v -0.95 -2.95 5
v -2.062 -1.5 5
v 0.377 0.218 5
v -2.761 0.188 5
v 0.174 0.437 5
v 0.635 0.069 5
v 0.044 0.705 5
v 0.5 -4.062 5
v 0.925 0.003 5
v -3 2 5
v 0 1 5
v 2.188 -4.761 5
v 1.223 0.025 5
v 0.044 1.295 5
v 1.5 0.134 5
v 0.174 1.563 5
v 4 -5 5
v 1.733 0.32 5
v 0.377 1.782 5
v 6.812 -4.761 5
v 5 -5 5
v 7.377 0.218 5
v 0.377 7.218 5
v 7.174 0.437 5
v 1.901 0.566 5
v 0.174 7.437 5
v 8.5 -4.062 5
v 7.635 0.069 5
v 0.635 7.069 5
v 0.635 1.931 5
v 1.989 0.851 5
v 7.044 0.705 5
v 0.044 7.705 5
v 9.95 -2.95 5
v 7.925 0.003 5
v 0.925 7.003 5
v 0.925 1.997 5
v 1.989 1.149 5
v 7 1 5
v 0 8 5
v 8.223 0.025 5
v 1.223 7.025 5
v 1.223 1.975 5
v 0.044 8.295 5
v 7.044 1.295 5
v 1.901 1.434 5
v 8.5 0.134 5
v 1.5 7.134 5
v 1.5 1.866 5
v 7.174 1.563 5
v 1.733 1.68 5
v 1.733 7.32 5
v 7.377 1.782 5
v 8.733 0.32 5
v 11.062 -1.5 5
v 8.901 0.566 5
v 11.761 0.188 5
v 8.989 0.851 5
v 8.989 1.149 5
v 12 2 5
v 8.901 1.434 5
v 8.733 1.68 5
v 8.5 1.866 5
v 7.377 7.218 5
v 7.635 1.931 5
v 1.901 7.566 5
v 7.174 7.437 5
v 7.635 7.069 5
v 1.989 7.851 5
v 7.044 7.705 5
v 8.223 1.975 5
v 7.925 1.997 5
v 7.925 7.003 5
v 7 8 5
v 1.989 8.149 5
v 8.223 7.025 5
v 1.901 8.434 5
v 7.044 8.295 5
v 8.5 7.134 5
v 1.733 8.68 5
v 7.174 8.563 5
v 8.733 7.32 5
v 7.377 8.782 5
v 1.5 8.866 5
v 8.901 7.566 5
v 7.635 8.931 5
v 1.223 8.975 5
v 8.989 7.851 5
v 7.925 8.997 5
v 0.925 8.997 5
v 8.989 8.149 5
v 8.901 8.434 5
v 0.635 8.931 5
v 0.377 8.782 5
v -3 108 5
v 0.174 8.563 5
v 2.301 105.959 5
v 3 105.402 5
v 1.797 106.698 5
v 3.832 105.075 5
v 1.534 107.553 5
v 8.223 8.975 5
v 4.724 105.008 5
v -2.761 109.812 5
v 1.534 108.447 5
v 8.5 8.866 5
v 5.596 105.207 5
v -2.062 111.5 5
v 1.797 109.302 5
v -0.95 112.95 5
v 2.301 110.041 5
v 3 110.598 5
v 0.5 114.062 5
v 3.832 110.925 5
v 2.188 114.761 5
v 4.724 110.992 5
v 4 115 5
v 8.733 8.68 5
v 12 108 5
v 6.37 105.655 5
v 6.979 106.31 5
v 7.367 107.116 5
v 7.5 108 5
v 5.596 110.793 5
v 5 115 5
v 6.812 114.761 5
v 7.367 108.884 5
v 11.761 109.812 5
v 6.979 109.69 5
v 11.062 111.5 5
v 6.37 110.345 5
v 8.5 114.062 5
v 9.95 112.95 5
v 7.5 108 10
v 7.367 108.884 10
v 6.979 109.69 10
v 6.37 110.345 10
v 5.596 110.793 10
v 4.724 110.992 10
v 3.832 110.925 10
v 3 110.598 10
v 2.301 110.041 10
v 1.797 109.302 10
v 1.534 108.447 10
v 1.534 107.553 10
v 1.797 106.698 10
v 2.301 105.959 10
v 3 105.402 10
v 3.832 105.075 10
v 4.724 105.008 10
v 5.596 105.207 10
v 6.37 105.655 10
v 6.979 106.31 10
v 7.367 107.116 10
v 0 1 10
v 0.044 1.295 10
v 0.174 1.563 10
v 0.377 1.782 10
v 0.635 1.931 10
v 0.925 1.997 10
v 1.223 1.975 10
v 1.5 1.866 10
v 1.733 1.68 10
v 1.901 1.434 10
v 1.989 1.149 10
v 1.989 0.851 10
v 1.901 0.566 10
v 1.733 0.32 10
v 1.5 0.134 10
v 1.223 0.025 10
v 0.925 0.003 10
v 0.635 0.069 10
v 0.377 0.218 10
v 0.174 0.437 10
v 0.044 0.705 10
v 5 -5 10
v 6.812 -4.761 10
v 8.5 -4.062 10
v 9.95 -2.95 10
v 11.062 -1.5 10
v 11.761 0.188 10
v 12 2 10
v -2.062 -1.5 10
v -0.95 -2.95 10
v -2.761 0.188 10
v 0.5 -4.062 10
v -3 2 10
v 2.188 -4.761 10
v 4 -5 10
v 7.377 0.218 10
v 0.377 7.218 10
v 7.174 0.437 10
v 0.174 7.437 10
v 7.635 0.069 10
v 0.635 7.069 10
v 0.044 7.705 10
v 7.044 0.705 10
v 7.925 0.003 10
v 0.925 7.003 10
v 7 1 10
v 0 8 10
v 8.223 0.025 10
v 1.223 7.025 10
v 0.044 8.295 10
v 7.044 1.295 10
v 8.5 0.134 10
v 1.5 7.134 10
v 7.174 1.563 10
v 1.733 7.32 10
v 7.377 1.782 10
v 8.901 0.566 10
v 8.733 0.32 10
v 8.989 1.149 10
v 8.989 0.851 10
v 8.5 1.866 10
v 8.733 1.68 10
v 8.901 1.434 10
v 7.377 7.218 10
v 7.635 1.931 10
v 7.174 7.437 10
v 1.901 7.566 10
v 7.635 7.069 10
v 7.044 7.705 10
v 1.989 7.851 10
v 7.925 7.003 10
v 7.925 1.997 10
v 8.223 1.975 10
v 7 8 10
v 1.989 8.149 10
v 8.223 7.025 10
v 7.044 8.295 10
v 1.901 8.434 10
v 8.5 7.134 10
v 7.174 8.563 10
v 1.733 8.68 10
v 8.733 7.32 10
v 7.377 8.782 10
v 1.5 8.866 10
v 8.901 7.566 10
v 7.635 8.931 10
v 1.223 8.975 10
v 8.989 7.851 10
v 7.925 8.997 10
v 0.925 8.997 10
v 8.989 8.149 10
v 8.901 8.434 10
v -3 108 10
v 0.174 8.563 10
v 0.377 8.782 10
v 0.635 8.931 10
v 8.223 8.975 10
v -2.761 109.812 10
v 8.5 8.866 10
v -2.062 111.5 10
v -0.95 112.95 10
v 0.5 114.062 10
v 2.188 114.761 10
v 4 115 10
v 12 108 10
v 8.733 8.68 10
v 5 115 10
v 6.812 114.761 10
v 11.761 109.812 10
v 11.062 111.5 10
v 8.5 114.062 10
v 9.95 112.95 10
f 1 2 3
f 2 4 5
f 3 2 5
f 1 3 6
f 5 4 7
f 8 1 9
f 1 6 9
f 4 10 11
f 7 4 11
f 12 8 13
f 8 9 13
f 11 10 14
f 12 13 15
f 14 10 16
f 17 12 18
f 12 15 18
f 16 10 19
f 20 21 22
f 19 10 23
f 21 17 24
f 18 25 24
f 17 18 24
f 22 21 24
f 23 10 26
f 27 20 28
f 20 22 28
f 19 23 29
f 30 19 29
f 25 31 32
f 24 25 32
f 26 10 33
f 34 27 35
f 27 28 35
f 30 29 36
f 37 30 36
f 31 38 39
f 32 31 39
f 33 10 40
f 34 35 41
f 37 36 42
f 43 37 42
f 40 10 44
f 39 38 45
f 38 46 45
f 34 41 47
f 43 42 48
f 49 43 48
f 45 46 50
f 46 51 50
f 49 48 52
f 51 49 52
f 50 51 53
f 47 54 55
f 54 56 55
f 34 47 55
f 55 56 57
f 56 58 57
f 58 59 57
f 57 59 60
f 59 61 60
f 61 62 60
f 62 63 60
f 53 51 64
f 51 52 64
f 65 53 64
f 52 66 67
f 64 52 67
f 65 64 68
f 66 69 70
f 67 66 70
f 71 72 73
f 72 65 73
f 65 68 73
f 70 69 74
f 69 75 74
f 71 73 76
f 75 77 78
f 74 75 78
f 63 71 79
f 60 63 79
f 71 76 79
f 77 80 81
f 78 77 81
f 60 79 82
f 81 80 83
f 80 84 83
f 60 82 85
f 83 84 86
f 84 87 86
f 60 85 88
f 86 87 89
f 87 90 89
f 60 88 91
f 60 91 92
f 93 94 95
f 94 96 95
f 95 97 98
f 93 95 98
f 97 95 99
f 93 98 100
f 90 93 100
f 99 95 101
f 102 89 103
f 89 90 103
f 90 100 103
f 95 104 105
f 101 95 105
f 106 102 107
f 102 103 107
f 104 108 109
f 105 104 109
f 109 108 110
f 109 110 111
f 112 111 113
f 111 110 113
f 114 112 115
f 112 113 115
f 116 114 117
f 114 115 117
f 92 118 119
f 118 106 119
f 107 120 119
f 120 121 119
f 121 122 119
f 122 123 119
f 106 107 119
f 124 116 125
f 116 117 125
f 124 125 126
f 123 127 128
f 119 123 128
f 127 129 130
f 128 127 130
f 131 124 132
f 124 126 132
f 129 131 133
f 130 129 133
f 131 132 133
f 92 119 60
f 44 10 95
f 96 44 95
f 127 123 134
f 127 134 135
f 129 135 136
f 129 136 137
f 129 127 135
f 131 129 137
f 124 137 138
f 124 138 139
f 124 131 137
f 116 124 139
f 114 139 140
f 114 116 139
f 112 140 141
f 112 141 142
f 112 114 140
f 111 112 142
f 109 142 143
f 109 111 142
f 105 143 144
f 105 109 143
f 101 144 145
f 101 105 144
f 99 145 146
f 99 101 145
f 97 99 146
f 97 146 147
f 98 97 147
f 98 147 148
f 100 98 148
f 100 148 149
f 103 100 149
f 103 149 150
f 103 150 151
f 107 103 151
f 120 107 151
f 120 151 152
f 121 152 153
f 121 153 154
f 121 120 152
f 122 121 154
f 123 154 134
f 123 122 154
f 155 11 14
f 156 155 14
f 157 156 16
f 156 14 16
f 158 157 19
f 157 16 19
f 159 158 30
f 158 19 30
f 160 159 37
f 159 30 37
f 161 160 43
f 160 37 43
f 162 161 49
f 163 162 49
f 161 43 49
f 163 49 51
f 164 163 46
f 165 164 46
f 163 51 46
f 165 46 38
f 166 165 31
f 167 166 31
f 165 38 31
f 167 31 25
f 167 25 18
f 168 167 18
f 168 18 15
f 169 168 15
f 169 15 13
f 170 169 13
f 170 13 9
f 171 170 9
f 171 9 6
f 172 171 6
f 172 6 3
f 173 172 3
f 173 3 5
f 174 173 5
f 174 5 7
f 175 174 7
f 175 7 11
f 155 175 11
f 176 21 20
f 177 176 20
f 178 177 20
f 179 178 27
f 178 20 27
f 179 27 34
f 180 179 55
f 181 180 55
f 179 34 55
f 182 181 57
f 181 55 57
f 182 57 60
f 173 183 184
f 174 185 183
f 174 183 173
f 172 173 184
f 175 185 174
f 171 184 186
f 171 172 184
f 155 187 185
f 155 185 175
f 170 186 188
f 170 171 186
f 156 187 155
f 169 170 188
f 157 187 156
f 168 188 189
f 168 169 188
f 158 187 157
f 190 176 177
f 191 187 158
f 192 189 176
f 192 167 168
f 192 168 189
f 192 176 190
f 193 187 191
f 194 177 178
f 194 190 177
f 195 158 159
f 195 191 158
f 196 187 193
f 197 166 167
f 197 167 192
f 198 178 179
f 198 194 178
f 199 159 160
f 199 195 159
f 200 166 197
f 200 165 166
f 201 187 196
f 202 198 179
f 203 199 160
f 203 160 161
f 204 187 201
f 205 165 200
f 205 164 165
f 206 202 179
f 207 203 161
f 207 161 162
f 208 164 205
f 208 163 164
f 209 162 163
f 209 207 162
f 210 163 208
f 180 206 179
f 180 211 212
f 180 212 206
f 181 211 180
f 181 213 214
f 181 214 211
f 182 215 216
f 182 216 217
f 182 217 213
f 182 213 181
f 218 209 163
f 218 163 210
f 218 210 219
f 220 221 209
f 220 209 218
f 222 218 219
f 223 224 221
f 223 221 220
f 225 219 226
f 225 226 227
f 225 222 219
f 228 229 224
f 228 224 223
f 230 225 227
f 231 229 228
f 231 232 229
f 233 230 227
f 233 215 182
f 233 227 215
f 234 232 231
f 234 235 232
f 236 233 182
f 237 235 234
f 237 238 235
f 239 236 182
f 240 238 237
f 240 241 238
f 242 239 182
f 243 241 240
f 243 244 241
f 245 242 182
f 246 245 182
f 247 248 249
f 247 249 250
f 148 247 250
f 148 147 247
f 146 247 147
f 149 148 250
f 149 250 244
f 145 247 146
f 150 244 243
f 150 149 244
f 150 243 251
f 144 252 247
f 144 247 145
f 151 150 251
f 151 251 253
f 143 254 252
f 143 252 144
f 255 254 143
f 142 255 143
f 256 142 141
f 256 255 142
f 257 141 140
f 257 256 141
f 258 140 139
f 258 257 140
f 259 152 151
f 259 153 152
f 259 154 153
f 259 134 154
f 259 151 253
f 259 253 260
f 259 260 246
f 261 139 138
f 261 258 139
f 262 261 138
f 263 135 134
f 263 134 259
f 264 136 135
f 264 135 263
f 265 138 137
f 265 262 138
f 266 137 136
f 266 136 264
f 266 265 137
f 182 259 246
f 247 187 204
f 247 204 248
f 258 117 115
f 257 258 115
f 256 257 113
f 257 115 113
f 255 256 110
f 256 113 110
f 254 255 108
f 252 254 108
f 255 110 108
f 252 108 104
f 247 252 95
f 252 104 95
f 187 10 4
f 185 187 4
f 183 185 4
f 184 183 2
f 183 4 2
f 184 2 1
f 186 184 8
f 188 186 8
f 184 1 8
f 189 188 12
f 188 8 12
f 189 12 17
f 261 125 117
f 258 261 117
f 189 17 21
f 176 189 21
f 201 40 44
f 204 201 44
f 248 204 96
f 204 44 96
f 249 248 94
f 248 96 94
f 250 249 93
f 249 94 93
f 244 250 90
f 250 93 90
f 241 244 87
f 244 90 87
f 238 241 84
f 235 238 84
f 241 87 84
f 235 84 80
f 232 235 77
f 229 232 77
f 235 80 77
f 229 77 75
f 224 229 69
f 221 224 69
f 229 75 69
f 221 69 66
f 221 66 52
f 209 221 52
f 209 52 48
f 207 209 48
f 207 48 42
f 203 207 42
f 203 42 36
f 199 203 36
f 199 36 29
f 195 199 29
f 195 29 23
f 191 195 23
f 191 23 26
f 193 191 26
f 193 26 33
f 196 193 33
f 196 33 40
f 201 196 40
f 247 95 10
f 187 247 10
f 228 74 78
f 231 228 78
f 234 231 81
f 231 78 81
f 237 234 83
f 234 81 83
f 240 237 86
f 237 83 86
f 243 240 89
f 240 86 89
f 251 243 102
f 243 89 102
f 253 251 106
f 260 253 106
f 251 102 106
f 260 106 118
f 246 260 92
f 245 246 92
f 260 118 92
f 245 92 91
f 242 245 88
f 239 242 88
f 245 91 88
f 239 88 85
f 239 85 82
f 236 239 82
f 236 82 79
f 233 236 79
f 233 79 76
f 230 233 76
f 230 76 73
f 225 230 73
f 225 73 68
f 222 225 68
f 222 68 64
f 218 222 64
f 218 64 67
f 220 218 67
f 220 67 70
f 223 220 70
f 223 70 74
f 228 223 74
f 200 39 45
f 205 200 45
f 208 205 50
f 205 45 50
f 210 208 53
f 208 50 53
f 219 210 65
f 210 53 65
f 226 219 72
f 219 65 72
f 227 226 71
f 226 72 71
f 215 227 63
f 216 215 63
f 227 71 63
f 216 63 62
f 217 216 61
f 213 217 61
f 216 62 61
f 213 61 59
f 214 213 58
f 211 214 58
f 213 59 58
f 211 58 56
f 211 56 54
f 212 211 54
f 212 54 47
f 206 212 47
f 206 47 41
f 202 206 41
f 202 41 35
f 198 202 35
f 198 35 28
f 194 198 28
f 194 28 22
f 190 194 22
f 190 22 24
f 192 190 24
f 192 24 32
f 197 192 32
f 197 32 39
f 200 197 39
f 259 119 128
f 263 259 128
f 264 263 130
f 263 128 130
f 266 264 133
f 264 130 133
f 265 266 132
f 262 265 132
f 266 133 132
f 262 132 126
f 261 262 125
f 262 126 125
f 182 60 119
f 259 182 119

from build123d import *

# Parameters (mm, degrees)
SKETCH1_R             = 1
BOSS_EXTRUDE1_DEPTH   = 5
BOSS_EXTRUDE1_2_DEPTH = 5
BOSS_EXTRUDE1_3_DEPTH = 5
BOSS_EXTRUDE1_4_DEPTH = 5
SKETCH2_R             = 3
BOSS_EXTRUDE2_DEPTH   = 5
SKETCH3_R             = 1
CUT_EXTRUDE2_DEPTH    = 10


with BuildPart() as part:
    # Sketch1 → Boss-Extrude1 (new body)
    with BuildSketch(Plane.XY):
        with Locations((8, 1)):
            Circle(SKETCH1_R)
    extrude(amount=BOSS_EXTRUDE1_DEPTH)



with BuildPart() as body_2:
    # Sketch1 → Boss-Extrude1 2 (new body)
    with BuildSketch(Plane.XY):
        with Locations((8, 8)):
            Circle(SKETCH1_R)
    extrude(amount=BOSS_EXTRUDE1_2_DEPTH)


with BuildPart() as body_3:
    # Sketch1 → Boss-Extrude1 3 (new body)
    with BuildSketch(Plane.XY):
        with Locations((1, 8)):
            Circle(SKETCH1_R)
    extrude(amount=BOSS_EXTRUDE1_3_DEPTH)


with BuildPart() as body_4:
    # Sketch1 → Boss-Extrude1 4 (new body)
    with BuildSketch(Plane.XY):
        with Locations((1, 1)):
            Circle(SKETCH1_R)
    extrude(amount=BOSS_EXTRUDE1_4_DEPTH)


with BuildPart() as part_1:
    add(part.part)

    add(body_2.part)  # Boss-Extrude2 merges body 2

    add(body_3.part)  # Boss-Extrude2 merges body 3

    add(body_4.part)  # Boss-Extrude2 merges body 4
    # Sketch2 → Boss-Extrude2 (add)
    with BuildSketch(Plane.XY.offset(5)):
        with BuildLine():
            Line((4, -5), (5, -5))
            ThreePointArc((5, -5), (9.949747468, -2.949747468), (12, 2))
            Line((12, 2), (12, 108))
            ThreePointArc((12, 108), (9.949747468, 112.949747468), (5, 115))
            Line((5, 115), (4, 115))
            ThreePointArc((4, 115), (-0.949747468, 112.949747468), (-3, 108))
            Line((-3, 108), (-3, 2))
            ThreePointArc((-3, 2), (-0.949747468, -2.949747468), (4, -5))
        make_face()
        with Locations((4.5, 108)):
            Circle(SKETCH2_R, mode=Mode.SUBTRACT)
    extrude(amount=BOSS_EXTRUDE2_DEPTH)

    # Sketch3 → Cut-Extrude2 (cut)
    with BuildSketch(Plane(origin=(0, 0, 0), x_dir=(-1, 0, 0), z_dir=(0, 0, -1))):
        with Locations((-8, 8)):
            Circle(SKETCH3_R)
        with Locations((-1, 8)):
            Circle(SKETCH3_R)
        with Locations((-1, 1)):
            Circle(SKETCH3_R)
        with Locations((-8, 1)):
            Circle(SKETCH3_R)
    extrude(amount=-CUT_EXTRUDE2_DEPTH, mode=Mode.SUBTRACT)


solid = part_1.part
